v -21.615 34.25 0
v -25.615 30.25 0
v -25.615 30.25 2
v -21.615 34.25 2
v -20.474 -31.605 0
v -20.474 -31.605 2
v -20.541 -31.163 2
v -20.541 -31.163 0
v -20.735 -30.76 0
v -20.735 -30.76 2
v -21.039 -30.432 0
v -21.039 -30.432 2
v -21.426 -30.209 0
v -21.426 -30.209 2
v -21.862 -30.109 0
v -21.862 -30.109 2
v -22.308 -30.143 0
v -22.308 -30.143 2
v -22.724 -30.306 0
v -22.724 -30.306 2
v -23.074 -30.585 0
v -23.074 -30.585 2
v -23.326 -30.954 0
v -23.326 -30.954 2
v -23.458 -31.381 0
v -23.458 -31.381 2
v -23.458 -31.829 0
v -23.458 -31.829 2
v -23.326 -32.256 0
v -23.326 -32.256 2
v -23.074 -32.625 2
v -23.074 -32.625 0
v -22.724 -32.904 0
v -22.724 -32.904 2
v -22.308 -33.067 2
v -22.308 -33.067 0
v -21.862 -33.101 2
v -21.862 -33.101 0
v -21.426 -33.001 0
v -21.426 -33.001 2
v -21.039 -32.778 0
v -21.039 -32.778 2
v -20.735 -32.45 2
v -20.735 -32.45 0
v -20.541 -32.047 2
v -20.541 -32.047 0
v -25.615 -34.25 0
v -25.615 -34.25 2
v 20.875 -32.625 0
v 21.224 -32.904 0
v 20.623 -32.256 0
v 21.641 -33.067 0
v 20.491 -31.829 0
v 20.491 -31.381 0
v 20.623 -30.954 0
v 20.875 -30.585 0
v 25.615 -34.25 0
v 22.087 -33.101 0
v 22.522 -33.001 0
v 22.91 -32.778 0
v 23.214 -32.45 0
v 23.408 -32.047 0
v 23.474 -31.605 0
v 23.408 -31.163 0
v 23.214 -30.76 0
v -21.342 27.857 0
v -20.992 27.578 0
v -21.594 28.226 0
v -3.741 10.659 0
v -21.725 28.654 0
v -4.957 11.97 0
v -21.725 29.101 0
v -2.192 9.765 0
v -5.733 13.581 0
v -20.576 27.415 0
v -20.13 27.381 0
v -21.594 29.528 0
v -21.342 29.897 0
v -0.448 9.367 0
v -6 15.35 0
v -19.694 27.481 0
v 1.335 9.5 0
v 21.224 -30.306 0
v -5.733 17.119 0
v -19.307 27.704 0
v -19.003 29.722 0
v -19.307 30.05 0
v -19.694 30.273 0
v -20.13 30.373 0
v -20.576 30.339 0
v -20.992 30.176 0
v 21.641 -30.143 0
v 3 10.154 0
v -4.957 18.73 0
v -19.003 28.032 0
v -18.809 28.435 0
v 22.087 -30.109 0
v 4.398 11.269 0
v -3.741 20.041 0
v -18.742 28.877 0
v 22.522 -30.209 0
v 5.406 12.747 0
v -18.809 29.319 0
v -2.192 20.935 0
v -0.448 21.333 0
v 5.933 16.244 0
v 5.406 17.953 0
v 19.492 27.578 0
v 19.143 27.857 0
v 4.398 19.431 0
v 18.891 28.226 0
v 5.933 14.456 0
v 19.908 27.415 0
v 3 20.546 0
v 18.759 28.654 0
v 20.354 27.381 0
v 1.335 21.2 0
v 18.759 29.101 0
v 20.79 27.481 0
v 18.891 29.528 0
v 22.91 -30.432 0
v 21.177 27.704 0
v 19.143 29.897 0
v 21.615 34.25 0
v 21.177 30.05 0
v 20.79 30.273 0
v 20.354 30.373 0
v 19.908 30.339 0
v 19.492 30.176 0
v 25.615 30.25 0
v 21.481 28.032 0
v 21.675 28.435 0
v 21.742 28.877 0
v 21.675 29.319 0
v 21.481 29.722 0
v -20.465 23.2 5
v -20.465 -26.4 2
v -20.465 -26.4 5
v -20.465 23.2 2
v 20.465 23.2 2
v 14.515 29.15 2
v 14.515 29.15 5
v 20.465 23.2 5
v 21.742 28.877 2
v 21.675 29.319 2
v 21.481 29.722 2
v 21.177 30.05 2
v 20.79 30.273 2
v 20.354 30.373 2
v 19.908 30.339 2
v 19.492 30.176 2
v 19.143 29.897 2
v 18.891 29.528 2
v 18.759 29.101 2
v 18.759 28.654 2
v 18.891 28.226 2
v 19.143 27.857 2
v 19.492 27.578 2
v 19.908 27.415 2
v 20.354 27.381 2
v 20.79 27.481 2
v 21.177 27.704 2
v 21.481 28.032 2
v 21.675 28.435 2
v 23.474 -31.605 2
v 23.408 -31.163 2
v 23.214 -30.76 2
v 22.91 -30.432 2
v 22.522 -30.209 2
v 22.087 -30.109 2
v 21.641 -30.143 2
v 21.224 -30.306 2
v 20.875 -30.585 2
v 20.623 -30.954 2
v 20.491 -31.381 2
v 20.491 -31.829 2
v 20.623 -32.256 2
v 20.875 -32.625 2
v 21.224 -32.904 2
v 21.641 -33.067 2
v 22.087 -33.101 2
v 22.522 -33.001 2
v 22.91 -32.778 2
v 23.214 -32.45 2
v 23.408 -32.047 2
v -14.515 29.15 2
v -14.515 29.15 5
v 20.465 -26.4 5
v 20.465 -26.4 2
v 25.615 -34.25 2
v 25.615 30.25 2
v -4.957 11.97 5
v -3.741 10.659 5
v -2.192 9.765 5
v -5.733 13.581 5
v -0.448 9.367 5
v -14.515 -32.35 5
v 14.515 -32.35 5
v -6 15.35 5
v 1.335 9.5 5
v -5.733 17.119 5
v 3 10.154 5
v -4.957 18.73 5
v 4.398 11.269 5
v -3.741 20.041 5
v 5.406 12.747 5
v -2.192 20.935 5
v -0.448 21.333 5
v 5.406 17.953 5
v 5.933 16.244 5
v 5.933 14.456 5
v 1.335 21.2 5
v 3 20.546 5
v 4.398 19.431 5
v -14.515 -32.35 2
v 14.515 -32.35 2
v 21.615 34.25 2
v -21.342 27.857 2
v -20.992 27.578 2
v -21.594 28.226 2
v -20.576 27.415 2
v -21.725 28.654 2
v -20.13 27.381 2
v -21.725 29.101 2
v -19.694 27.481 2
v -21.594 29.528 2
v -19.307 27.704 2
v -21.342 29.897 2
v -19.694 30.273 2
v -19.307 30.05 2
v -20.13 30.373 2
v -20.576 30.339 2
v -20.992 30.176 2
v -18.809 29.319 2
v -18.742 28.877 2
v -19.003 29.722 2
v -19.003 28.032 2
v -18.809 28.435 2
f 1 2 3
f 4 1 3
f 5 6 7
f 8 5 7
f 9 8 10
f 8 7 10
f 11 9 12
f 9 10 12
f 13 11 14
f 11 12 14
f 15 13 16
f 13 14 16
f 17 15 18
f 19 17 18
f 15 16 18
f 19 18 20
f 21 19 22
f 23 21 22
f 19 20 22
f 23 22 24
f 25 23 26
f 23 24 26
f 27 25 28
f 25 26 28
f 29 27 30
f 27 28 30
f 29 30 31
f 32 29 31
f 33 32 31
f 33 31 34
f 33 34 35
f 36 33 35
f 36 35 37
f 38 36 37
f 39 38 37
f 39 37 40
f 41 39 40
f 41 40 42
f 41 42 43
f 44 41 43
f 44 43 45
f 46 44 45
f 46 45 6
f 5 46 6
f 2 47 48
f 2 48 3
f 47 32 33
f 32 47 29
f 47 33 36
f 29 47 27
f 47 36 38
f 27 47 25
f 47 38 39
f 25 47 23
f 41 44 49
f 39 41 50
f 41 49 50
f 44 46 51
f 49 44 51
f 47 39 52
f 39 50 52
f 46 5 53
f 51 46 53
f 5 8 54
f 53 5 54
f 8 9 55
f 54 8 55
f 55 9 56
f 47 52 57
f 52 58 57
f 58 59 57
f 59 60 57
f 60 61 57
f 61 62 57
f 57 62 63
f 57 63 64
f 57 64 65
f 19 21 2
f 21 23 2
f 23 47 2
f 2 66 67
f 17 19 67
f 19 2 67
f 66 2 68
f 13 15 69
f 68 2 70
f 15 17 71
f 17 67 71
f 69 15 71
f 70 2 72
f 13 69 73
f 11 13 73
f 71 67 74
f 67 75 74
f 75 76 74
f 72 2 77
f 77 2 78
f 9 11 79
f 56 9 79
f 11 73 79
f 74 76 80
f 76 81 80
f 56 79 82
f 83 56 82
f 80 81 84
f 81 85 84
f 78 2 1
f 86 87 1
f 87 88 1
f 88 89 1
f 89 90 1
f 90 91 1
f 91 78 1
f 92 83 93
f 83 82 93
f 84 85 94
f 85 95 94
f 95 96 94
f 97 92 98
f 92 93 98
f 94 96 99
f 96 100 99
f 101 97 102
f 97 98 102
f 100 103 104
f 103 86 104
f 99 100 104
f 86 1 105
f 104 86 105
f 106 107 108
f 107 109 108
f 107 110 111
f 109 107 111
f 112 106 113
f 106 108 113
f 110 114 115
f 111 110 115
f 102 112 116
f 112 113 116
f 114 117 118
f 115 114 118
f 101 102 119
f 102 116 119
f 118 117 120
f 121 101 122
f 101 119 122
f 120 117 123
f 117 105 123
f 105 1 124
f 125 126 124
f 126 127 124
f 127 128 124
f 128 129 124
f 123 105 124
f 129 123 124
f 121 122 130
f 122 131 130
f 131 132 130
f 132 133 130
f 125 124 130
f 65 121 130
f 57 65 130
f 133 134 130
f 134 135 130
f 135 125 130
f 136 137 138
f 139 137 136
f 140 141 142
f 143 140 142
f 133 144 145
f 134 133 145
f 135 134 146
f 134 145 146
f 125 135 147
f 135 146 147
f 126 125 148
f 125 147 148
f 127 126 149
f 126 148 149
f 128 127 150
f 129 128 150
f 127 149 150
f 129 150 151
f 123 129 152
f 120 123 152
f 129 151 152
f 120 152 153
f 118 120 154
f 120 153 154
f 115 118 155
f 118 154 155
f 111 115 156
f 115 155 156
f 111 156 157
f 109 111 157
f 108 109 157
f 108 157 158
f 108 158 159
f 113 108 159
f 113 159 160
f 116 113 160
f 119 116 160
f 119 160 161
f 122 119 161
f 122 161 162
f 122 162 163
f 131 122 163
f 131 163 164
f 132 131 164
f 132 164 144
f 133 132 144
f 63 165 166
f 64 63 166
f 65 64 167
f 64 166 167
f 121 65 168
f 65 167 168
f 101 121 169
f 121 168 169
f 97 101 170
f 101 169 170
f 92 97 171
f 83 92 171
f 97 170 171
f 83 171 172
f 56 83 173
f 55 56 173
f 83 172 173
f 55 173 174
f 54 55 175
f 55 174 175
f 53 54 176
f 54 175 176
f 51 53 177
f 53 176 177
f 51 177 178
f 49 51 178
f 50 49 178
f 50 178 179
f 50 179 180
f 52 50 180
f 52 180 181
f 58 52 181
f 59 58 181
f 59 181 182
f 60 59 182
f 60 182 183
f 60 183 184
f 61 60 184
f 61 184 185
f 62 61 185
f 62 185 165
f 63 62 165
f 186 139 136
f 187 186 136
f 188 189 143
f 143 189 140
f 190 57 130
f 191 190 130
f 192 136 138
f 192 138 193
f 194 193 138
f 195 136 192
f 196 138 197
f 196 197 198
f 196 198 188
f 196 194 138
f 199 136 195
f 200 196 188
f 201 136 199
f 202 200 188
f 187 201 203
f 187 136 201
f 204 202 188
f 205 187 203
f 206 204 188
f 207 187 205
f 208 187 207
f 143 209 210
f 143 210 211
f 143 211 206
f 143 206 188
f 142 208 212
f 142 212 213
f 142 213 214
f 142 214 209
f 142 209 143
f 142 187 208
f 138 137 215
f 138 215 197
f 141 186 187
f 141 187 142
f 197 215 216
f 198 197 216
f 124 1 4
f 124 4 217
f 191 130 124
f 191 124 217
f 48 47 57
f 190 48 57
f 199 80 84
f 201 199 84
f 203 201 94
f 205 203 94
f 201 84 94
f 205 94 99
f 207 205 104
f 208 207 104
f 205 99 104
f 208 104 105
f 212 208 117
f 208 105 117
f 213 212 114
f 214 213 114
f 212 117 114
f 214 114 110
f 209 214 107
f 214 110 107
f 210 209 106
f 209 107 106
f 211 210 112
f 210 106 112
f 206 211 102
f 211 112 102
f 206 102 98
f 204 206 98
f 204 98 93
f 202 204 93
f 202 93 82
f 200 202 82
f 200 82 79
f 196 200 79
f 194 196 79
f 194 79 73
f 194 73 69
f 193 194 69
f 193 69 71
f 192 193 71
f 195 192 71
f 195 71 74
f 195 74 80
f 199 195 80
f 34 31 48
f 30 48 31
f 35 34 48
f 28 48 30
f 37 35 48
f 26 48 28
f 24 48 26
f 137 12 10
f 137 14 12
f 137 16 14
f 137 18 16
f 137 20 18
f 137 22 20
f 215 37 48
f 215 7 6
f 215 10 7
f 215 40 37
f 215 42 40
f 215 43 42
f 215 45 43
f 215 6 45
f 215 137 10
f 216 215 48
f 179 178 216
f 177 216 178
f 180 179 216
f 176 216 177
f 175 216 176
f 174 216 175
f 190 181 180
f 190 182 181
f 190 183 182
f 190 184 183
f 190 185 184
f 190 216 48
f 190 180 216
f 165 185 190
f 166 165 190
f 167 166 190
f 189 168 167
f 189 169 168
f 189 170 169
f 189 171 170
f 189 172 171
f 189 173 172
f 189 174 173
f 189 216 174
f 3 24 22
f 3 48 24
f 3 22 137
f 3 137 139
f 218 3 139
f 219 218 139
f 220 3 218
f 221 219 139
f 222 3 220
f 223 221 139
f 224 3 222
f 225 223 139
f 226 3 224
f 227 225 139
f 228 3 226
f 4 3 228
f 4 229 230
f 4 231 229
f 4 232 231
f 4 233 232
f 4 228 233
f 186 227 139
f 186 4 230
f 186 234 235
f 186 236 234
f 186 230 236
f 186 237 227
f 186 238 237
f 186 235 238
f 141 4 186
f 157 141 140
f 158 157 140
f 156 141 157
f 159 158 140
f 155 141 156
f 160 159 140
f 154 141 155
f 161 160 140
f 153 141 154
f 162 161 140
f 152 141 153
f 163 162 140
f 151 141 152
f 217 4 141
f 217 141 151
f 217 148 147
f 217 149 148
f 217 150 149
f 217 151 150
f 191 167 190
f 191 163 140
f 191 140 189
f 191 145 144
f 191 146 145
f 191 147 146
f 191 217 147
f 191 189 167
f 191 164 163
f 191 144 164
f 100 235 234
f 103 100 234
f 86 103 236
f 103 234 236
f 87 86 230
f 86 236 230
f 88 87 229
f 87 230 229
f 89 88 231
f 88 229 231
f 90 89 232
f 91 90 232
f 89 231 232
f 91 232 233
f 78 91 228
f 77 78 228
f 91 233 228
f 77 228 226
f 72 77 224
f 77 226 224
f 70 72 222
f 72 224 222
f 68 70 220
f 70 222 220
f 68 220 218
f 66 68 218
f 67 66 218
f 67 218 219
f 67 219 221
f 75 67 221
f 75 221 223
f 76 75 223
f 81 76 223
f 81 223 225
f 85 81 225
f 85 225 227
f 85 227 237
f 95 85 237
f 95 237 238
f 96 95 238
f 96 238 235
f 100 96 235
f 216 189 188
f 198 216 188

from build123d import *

# Parameters (mm, degrees)
SKETCH1_W           = 51.23
SKETCH1_H           = 68.5
BOSS_EXTRUDE1_DEPTH = 2
CHAMFER1_SIZE       = 4
SKETCH3_W           = 40.93
SKETCH3_H           = 61.5
BOSS_EXTRUDE3_DEPTH = 3
CHAMFER2_SIZE       = 5.95
SKETCH4_R           = 1.5
CUT_EXTRUDE1_DEPTH  = 43.874126522
SKETCH5_R           = 6
CUT_EXTRUDE2_DEPTH  = 44.060314966


with BuildPart() as part:
    # Sketch1 → Boss-Extrude1 (new body)
    with BuildSketch(Plane.XY):
        Rectangle(SKETCH1_W, SKETCH1_H)
    extrude(amount=BOSS_EXTRUDE1_DEPTH)

    # Chamfer1
    chamfer1_edges = [part.edges().sort_by_distance(p)[0] for p in [
        (-25.615, 34.25, 1),
        (25.615, 34.25, 1),
    ]]
    chamfer(chamfer1_edges, length=CHAMFER1_SIZE)

    # Sketch3 → Boss-Extrude3 (add)
    with BuildSketch(Plane.XY.offset(2)):
        with Locations((0, -1.6)):
            Rectangle(SKETCH3_W, SKETCH3_H)
    extrude(amount=BOSS_EXTRUDE3_DEPTH)

    # Chamfer2
    chamfer2_edges = [part.edges().sort_by_distance(p)[0] for p in [
        (20.465, -32.35, 3.5),
        (20.465, 29.15, 3.5),
        (-20.465, 29.15, 3.5),
        (-20.465, -32.35, 3.5),
    ]]
    chamfer(chamfer2_edges, length=CHAMFER2_SIZE)

    # Sketch4 → Cut-Extrude1 (cut, through all)
    with BuildSketch(Plane.XY.offset(2)):
        with Locations((-20.242100654, 28.877100654)):
            Circle(SKETCH4_R)
        with Locations((20.242100654, 28.877100654)):
            Circle(SKETCH4_R)
        with Locations((21.974423525, -31.604966365)):
            Circle(SKETCH4_R)
        with Locations((-21.974423525, -31.604966365)):
            Circle(SKETCH4_R)
    extrude(amount=-CUT_EXTRUDE1_DEPTH, mode=Mode.SUBTRACT)

    # Sketch5 → Cut-Extrude2 (cut, through all)
    with BuildSketch(Plane(origin=(0, 0, 0), x_dir=(-1, 0, 0), z_dir=(0, 0, -1))):
        with Locations((0, 15.35)):
            Circle(SKETCH5_R)
    extrude(amount=-CUT_EXTRUDE2_DEPTH, mode=Mode.SUBTRACT)


solid = part.part
